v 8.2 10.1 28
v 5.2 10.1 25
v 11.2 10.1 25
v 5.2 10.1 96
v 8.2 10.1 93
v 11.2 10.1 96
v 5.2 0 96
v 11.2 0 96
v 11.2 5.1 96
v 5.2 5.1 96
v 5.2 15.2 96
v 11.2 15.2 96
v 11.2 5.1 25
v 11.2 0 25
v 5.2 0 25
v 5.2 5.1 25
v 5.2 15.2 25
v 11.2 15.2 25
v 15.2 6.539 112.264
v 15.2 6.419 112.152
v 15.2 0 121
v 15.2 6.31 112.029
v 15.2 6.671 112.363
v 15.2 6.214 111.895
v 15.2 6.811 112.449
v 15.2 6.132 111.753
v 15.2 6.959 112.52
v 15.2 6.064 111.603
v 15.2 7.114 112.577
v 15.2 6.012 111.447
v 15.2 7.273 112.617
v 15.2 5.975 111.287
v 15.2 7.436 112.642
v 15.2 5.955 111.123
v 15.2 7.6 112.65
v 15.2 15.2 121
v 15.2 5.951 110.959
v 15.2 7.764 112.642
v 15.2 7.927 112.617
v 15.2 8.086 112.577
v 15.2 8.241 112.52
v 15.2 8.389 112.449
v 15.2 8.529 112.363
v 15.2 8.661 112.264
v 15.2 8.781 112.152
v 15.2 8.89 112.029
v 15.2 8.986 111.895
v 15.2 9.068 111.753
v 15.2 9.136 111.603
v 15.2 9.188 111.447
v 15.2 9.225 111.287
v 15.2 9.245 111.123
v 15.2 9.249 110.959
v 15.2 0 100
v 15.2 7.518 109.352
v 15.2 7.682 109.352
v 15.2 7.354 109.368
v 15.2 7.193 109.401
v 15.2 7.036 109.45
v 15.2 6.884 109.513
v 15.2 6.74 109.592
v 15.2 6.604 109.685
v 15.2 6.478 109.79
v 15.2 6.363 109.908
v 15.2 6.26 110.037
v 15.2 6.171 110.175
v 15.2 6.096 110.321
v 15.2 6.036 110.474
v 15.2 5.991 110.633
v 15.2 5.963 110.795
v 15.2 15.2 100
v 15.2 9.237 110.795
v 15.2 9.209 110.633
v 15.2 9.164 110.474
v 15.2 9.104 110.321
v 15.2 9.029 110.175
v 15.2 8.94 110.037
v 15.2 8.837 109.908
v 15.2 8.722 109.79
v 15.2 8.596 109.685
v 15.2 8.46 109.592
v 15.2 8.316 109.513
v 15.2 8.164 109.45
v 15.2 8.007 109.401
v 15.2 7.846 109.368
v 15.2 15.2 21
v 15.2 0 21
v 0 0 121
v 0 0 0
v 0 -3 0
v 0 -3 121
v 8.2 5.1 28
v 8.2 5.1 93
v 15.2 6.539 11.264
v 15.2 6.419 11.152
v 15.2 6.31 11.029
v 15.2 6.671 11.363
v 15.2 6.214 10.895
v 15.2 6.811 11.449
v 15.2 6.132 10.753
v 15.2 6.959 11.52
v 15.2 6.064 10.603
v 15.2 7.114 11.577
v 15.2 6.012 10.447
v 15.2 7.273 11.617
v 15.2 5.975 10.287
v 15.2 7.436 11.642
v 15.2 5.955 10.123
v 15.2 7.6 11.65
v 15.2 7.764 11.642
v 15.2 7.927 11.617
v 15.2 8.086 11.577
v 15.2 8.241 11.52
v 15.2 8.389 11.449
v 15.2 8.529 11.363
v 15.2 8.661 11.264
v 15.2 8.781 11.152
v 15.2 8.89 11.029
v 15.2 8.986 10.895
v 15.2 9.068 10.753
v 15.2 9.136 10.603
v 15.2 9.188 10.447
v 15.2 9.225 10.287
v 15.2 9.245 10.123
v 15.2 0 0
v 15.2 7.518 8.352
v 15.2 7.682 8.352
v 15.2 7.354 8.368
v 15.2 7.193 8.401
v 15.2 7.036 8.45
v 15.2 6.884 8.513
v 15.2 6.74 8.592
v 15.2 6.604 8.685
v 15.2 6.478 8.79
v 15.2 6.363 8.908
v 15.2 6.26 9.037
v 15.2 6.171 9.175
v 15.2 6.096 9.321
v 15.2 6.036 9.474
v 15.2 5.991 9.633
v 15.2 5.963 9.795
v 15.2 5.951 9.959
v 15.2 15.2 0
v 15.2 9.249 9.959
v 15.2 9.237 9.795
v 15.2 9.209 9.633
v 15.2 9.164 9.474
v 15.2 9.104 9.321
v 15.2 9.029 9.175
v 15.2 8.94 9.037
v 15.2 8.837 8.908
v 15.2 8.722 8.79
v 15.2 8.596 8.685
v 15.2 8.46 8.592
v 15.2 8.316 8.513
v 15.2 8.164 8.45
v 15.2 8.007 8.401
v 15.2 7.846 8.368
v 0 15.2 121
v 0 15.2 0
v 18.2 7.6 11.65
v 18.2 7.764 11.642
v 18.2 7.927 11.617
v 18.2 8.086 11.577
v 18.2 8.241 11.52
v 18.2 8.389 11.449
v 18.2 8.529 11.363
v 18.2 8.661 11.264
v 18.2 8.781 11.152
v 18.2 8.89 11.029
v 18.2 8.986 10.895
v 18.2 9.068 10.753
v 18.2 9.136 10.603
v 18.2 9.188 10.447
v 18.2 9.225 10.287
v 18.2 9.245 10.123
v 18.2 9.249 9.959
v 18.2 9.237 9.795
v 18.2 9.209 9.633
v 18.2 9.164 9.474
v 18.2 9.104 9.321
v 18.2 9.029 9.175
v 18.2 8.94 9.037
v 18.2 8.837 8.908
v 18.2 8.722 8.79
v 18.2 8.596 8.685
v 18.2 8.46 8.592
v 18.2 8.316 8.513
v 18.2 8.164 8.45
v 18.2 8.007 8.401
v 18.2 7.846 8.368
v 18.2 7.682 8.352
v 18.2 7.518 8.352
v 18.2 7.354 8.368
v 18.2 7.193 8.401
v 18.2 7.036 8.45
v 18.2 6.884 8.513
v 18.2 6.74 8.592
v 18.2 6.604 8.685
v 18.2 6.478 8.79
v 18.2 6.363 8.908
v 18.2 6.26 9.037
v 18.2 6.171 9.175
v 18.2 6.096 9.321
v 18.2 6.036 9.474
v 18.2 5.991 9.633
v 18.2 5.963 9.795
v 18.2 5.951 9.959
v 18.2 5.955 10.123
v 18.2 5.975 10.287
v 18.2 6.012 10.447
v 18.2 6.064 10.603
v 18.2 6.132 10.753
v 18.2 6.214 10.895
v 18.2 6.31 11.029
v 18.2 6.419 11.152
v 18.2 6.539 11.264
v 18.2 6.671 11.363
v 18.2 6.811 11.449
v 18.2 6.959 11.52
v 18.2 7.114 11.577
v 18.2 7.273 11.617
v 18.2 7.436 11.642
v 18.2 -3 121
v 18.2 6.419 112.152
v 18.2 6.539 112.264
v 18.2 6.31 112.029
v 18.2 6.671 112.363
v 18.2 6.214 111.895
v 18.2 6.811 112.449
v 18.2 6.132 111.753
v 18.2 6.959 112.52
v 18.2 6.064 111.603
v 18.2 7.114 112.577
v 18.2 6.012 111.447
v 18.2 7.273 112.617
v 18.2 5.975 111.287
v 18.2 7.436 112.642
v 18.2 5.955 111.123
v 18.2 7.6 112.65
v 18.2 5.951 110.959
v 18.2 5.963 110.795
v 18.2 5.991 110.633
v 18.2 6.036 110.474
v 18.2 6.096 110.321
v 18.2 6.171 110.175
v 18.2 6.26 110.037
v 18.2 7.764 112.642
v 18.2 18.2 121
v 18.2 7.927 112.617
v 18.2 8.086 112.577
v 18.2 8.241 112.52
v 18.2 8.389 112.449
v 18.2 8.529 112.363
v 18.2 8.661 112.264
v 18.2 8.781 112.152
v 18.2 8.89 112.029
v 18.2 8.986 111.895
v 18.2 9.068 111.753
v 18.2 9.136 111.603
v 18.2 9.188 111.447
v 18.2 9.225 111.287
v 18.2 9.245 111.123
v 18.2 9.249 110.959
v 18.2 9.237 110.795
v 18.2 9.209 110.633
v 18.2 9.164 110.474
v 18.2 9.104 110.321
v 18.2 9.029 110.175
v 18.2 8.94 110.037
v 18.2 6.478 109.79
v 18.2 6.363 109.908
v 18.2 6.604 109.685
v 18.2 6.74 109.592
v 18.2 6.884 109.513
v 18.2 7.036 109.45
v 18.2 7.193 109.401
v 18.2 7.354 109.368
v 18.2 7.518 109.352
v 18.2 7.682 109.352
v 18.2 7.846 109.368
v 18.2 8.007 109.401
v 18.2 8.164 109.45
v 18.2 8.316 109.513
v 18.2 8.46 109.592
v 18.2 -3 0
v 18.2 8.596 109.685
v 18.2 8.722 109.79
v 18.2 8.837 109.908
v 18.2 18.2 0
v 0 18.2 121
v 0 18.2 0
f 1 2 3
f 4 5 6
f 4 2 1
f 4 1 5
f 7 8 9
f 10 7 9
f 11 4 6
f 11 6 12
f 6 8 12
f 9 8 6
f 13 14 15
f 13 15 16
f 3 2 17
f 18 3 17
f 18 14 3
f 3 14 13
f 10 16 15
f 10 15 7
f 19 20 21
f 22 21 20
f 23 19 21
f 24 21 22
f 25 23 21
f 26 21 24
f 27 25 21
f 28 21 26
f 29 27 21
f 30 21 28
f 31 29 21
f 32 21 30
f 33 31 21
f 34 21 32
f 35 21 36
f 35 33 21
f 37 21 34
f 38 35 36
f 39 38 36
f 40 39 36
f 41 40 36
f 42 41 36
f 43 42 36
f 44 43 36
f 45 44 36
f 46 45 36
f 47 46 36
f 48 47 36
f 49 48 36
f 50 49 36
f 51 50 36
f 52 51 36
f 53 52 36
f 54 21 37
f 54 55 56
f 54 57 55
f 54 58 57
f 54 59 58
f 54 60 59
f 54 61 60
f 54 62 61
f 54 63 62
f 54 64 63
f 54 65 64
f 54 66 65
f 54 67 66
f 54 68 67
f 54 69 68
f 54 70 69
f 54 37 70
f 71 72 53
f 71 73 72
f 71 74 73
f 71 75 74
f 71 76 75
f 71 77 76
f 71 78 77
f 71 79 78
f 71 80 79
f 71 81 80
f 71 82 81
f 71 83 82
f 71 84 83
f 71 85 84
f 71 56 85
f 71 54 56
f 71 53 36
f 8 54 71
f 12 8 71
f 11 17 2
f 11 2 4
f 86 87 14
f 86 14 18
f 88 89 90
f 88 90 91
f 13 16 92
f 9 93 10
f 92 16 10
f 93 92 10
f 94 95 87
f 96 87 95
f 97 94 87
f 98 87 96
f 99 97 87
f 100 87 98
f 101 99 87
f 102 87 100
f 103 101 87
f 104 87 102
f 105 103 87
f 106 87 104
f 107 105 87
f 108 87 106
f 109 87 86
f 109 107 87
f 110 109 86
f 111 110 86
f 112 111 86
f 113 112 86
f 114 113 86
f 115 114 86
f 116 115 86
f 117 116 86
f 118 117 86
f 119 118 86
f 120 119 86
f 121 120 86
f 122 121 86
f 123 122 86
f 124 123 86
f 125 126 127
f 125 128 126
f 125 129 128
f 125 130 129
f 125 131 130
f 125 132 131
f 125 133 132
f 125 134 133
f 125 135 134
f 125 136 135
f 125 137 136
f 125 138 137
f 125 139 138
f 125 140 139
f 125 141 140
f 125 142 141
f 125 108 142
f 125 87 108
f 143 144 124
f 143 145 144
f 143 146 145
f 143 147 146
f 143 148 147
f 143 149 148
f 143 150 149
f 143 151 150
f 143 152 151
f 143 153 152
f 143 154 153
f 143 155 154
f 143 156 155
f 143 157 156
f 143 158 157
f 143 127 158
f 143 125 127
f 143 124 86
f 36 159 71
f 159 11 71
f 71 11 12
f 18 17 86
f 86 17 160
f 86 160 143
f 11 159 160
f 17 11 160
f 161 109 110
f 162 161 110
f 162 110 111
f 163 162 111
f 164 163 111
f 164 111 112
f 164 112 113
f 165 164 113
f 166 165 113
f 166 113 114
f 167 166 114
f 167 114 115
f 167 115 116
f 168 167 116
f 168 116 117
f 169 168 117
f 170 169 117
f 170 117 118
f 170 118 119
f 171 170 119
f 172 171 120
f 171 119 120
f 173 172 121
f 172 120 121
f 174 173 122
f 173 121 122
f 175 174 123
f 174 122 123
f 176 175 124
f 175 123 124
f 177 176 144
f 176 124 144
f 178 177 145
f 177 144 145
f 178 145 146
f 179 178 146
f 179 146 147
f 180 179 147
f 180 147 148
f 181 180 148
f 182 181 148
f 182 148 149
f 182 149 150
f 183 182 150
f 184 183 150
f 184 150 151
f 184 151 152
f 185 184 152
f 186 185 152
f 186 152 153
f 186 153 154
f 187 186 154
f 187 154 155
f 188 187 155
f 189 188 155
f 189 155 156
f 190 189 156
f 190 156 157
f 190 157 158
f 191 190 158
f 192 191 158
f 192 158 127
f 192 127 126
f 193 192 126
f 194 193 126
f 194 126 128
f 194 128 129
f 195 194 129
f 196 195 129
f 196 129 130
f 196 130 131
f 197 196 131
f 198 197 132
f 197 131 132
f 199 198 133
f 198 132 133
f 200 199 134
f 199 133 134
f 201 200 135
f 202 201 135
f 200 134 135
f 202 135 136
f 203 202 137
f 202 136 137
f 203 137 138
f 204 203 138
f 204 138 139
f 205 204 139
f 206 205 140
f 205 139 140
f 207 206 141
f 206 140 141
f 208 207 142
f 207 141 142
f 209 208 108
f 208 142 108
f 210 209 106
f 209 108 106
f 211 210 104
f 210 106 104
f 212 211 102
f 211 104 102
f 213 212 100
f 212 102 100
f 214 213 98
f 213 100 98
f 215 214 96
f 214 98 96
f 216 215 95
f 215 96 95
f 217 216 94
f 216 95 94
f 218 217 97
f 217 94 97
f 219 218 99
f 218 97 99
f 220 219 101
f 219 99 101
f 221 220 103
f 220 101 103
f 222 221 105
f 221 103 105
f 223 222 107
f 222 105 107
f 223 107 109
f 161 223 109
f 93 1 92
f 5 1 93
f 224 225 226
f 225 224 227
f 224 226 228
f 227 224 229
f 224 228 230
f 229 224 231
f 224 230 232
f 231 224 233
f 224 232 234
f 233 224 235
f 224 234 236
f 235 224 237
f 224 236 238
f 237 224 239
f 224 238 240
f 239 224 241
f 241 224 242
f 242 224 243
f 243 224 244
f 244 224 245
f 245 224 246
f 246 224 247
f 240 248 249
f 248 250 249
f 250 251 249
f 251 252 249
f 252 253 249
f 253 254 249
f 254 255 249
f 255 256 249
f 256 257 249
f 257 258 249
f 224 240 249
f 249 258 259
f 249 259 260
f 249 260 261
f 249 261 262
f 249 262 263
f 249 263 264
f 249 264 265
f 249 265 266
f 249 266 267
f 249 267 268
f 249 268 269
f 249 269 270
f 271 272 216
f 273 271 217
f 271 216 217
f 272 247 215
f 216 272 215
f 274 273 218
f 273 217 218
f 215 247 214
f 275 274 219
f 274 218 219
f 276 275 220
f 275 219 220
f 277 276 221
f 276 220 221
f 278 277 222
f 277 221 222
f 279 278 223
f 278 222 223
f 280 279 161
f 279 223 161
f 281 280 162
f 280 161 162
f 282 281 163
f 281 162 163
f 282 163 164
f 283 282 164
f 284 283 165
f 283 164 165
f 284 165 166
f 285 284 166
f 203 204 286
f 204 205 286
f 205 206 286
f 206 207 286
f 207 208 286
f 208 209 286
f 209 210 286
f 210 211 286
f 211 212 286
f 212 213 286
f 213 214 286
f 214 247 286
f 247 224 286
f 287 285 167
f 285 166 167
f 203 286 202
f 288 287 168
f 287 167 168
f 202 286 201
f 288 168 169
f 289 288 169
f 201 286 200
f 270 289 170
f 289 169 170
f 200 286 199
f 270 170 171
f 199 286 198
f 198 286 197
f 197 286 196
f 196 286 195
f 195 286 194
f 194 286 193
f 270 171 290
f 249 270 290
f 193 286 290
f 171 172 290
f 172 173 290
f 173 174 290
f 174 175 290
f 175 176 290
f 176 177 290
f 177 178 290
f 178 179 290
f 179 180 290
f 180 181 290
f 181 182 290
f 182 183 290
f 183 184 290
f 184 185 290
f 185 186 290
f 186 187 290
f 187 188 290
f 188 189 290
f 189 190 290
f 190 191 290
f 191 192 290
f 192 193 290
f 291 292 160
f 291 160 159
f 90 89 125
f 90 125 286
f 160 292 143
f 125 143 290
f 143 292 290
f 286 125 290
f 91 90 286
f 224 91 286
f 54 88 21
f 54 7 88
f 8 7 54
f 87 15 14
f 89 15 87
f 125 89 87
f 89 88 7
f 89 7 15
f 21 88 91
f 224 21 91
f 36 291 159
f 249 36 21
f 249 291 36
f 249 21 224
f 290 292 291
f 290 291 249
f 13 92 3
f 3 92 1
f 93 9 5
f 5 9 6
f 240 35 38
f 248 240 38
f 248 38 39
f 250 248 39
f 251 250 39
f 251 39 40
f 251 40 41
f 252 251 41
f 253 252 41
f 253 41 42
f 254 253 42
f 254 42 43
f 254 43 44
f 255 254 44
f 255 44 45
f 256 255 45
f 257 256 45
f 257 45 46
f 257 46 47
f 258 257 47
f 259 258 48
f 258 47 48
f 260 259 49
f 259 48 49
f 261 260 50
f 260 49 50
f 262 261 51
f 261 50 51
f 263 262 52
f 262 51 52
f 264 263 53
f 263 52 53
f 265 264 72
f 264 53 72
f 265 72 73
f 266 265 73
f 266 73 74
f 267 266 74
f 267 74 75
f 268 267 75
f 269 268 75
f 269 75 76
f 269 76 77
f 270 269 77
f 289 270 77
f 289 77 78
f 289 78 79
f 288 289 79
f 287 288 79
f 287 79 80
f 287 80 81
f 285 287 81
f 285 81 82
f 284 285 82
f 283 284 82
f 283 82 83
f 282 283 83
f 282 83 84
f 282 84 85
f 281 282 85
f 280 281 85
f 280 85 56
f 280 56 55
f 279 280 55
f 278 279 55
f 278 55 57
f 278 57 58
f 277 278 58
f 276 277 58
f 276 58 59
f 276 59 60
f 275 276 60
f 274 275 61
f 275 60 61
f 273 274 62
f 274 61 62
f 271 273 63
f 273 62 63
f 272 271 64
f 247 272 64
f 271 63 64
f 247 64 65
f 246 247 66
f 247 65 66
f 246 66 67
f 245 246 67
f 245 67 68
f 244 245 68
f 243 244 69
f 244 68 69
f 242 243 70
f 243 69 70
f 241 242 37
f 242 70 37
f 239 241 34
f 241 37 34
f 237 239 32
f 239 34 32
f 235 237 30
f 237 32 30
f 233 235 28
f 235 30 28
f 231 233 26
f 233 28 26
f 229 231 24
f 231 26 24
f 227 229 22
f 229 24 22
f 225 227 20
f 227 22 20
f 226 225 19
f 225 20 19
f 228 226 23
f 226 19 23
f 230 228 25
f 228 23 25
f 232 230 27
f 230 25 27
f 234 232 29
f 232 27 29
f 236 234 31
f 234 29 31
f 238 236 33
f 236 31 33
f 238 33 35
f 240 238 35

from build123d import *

# Parameters (mm, degrees)
SKETCH_1_W          = 21.2
SKETCH_1_H          = 21.2
SKETCH_1_W_2        = 15.2
SKETCH_1_H_2        = 15.2
EXTRUDE_1_DEPTH     = 121
SKETCH_2_R          = 1.65
CUT_EXTRUDE_1_DEPTH = 30
SKETCH_3_W          = 314.053168424
SKETCH_3_H          = 46.219516436
CUT_EXTRUDE_2_DEPTH = 3
SKETCH_4_W          = 5
SKETCH_4_H          = 15.2
EXTRUDE_1_2_DEPTH   = 10
SKETCH_5_W          = 61
SKETCH_5_H          = 5
EXTRUDE_2_DEPTH     = 10
SKETCH_6_W          = 71
SKETCH_6_H          = 15.2
EXTRUDE_3_DEPTH     = 10
SKETCH_8_W          = 71
SKETCH_8_H          = 5
CUT_EXTRUDE_3_DEPTH = 3
CHAMFER_1_SIZE      = 3
CHAMFER_2_SIZE      = 4


with BuildPart() as part:
    # 草图1 → Extrude 1 (new body)
    with BuildSketch(Plane.XY):
        with Locations((7.6, 7.6)):
            Rectangle(SKETCH_1_W, SKETCH_1_H)
        with Locations((7.6, 7.6)):
            Rectangle(SKETCH_1_W_2, SKETCH_1_H_2, mode=Mode.SUBTRACT)
    extrude(amount=EXTRUDE_1_DEPTH)

    # 草图2 → 切除-拉伸1 (cut)
    with BuildSketch(Plane.ZY.offset(3)):
        with Locations((10, 7.6)):
            Circle(SKETCH_2_R)
        with Locations((111, 7.6)):
            Circle(SKETCH_2_R)
    extrude(amount=-CUT_EXTRUDE_1_DEPTH, mode=Mode.SUBTRACT)

    # 草图3 → 切除-拉伸2 (cut)
    with BuildSketch(Plane.ZY.offset(3)):
        with Locations((151.731232528, 0.202739406)):
            Rectangle(SKETCH_3_W, SKETCH_3_H)
    extrude(amount=-CUT_EXTRUDE_2_DEPTH, mode=Mode.SUBTRACT)

    # 草图4 → Extrude 1 2 (add)
    with BuildSketch(Plane.ZY.offset(-15.2)):
        with Locations((27.5, 7.6)):
            Rectangle(SKETCH_4_W, SKETCH_4_H)
        with Locations((93.5, 7.6)):
            Rectangle(SKETCH_4_W, SKETCH_4_H)
    extrude(amount=EXTRUDE_1_2_DEPTH)

    # 草图5 → 凸台-拉伸2 (add)
    with BuildSketch(Plane.ZY.offset(-15.2)):
        with Locations((60.5, 7.6)):
            Rectangle(SKETCH_5_W, SKETCH_5_H)
    extrude(amount=EXTRUDE_2_DEPTH)

    # 草图6 → 凸台-拉伸3 (add)
    with BuildSketch(Plane.ZY.offset(-15.2)):
        with Locations((60.5, 7.6)):
            Rectangle(SKETCH_6_W, SKETCH_6_H)
    extrude(amount=EXTRUDE_3_DEPTH)

    # 草图8 → 切除-拉伸3 (cut)
    with BuildSketch(Plane.ZY.offset(-5.2)):
        with Locations((60.5, 7.6)):
            Rectangle(SKETCH_8_W, SKETCH_8_H)
    extrude(amount=-CUT_EXTRUDE_3_DEPTH, mode=Mode.SUBTRACT)

    # 倒角1
    chamfer_1_edges = [part.edges().sort_by_distance(p)[0] for p in [
        (8.2, 7.6, 25),
        (8.2, 7.6, 96),
    ]]
    chamfer(chamfer_1_edges, length=CHAMFER_1_SIZE)

    # 倒角2
    chamfer_2_edges = [part.edges().sort_by_distance(p)[0] for p in [
        (15.2, 7.6, 25),
        (15.2, 7.6, 96),
    ]]
    chamfer(chamfer_2_edges, length=CHAMFER_2_SIZE - 0.0001)  # a hair under: the kernel refuses the full size


solid = part.part
